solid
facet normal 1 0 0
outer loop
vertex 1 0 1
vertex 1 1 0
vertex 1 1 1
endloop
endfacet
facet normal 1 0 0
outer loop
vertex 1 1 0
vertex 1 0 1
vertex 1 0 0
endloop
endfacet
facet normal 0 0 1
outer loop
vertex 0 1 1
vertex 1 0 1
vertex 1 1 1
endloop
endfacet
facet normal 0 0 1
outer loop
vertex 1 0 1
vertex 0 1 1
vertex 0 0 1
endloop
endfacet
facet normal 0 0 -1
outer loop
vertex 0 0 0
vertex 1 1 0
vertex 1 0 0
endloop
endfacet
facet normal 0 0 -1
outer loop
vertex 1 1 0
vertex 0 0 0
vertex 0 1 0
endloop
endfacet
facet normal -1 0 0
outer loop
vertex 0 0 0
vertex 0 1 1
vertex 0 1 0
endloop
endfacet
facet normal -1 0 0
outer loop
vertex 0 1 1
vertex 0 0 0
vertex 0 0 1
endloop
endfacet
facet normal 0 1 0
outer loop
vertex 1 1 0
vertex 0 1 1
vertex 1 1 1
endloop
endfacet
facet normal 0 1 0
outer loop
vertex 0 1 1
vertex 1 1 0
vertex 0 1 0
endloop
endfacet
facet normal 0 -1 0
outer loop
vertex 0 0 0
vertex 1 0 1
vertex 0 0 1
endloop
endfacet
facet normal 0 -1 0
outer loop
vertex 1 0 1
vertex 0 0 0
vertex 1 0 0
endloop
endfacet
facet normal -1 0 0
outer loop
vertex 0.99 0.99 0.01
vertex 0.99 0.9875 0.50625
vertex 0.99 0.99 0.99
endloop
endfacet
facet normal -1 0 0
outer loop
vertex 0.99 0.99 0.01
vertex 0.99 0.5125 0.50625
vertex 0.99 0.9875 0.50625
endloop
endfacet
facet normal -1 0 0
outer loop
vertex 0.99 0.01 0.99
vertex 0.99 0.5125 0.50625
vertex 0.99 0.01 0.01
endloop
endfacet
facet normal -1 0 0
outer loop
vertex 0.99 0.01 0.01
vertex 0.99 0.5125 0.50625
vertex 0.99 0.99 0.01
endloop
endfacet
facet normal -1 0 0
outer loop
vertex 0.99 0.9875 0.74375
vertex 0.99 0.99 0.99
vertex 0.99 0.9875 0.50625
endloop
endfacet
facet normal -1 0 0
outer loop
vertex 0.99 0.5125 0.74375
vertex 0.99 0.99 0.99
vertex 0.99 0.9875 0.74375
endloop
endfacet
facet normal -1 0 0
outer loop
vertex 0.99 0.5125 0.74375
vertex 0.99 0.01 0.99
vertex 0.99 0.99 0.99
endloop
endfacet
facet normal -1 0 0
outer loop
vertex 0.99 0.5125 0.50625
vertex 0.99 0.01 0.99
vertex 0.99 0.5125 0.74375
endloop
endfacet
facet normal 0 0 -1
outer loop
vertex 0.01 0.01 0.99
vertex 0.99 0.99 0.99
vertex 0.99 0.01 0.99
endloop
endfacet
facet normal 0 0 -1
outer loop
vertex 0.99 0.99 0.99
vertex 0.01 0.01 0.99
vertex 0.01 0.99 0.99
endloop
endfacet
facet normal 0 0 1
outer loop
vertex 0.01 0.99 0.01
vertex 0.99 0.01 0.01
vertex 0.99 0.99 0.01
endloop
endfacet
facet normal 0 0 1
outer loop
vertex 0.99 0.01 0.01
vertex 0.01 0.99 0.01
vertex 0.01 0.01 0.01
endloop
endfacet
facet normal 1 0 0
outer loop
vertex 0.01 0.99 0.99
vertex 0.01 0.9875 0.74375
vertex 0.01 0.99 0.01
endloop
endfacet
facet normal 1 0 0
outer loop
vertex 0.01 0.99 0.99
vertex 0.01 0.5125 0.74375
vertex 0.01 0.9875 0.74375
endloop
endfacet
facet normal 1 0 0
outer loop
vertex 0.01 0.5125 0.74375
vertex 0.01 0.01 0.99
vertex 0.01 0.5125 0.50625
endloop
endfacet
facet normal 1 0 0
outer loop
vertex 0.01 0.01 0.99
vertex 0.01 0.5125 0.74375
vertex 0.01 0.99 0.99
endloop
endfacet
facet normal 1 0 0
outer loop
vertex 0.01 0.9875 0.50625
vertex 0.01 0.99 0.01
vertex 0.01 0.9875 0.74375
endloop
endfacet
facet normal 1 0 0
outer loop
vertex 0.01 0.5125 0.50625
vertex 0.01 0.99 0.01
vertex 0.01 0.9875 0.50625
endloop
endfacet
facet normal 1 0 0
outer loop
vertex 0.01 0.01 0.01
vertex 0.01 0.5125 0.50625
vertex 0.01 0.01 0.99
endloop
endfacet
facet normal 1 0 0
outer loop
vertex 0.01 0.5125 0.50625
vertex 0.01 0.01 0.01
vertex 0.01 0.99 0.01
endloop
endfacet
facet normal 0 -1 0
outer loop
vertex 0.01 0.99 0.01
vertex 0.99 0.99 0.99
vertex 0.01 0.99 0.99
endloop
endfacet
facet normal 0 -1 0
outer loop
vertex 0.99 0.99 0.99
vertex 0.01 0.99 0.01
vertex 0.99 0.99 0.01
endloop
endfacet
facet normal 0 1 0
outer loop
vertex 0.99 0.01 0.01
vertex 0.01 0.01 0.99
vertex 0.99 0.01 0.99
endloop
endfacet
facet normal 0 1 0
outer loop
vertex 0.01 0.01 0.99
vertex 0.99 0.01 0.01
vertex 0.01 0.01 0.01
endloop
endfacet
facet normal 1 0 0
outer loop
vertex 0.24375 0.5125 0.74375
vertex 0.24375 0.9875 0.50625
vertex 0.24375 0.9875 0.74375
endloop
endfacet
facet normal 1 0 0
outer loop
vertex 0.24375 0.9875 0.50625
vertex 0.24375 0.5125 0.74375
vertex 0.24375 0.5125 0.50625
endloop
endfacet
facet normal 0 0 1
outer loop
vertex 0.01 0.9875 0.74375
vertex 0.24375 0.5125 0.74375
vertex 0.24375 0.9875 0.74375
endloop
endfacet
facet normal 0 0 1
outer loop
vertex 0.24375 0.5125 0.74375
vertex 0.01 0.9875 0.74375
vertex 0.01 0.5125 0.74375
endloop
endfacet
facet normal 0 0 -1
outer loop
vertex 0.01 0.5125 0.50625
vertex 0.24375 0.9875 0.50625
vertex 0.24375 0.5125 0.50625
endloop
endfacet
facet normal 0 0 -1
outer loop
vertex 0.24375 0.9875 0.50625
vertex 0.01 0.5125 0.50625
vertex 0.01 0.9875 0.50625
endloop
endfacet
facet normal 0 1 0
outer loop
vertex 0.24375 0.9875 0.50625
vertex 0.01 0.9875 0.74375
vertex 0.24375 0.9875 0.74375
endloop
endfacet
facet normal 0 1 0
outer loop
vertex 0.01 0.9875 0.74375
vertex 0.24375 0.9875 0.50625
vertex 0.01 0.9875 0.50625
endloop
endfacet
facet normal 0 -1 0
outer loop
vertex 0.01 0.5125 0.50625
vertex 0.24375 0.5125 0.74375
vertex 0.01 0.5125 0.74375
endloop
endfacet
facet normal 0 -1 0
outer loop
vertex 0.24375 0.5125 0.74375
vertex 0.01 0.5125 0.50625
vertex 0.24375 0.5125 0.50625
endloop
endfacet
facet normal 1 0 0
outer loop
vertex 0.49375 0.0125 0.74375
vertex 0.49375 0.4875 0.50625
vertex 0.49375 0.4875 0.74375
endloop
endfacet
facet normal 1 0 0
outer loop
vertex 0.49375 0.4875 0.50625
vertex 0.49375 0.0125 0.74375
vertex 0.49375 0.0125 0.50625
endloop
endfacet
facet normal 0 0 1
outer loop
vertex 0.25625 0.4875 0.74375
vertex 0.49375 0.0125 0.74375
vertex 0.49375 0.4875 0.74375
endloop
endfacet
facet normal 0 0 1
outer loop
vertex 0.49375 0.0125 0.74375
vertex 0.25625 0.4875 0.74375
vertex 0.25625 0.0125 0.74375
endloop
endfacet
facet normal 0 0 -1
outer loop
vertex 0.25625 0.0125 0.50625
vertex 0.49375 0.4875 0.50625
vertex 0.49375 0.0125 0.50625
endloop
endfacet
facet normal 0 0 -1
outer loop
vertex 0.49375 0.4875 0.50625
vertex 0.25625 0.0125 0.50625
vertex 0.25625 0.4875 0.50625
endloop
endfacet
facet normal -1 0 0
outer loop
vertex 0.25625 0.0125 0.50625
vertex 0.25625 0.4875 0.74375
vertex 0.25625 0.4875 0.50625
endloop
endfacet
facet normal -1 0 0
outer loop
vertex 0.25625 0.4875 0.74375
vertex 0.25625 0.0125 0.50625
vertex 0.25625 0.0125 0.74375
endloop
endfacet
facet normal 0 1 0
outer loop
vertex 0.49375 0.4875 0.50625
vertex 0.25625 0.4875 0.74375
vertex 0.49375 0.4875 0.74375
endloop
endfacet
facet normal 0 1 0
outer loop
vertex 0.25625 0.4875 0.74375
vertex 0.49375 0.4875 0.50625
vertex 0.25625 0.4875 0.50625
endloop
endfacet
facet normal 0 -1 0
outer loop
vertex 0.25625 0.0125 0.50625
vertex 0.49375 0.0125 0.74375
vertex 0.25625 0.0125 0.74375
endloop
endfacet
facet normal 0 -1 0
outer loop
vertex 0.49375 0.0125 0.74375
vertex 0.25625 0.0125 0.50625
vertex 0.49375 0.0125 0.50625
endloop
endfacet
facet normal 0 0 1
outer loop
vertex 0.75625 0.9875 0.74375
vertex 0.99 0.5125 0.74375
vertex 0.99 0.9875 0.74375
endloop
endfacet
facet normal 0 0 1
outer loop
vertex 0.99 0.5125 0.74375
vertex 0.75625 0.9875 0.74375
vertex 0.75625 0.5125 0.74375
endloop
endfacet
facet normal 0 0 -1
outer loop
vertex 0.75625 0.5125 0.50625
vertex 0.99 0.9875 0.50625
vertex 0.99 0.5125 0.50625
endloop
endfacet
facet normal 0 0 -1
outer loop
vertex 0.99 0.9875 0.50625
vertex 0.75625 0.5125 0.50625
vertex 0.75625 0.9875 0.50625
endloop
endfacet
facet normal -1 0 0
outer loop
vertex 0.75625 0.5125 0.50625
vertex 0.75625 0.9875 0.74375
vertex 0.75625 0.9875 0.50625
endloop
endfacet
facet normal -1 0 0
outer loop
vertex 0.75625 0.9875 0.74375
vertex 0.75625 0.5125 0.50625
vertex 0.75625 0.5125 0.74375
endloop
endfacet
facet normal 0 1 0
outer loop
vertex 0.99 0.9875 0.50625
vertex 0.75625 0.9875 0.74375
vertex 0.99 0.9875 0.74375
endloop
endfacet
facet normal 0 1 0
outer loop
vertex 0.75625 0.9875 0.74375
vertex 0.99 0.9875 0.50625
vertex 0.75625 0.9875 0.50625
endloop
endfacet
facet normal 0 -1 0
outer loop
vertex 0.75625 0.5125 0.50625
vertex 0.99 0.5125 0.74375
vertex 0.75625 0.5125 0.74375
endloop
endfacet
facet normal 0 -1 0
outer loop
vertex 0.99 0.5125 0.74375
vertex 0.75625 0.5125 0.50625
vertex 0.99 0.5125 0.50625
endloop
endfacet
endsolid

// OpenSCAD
translate([0.125, 0.75, 0.625]) color([0.7511961766341985, 0.08905517025934961, 0.8809844539432513]) cube([0.2375, 0.475, 0.2375], center=true);
translate([0.375, 0.25, 0.625]) color([0.9000559978129854, 0.24961533485301535, 0.783578978277694]) cube([0.2375, 0.475, 0.2375], center=true);
translate([0.875, 0.75, 0.625]) color([0.719170536719719, 0.7381890865001747, 0.8253608447106495]) cube([0.2375, 0.475, 0.2375], center=true);
color([0.3,0.3,0.3,0.3]) difference() { cube([1,1,1]); translate([0.01,0.01,0.01]) cube([0.98,0.98,0.98]); }
